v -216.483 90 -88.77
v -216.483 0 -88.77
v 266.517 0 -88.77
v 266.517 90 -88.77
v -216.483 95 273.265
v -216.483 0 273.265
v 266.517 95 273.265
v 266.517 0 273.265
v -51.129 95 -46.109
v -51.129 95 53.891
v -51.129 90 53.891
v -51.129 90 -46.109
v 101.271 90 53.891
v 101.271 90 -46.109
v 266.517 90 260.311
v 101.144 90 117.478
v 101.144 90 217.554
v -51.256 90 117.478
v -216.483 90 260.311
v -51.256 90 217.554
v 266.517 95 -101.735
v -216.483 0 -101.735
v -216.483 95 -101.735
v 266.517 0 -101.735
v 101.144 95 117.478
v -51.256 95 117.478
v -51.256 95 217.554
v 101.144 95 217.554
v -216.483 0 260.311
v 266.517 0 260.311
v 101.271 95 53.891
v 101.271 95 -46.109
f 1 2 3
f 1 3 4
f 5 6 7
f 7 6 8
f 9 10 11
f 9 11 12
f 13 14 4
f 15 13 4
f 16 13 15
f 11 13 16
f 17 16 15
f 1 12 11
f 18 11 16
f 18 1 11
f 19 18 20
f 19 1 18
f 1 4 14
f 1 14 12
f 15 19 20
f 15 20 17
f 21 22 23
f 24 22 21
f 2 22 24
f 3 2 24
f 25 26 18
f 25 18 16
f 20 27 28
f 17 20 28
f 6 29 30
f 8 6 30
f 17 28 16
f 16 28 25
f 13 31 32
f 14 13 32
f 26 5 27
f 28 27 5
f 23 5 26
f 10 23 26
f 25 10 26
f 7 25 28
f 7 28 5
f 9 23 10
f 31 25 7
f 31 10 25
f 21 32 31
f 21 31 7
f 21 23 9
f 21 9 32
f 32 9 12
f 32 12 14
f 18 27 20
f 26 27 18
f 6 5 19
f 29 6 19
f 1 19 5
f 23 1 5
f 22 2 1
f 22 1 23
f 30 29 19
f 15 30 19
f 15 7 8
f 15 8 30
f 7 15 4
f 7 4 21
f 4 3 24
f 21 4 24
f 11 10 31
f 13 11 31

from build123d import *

# Parameters (mm, degrees)
SKETCH1_W           = 483
SKETCH1_H           = 375
BOSS_EXTRUDE1_DEPTH = 95
SKETCH2_W           = 349.080578543
SKETCH2_H           = 90
CUT_EXTRUDE1_DEPTH  = 531.118
SKETCH3_W           = 152.4
SKETCH3_H           = 100
SKETCH3_H_2         = 100.076
CUT_EXTRUDE2_DEPTH  = 531.118


with BuildPart() as part:
    # Sketch1 → Boss-Extrude1 (new body)
    with BuildSketch(Plane(origin=(0, 0, 0), x_dir=(1, 0, 0), z_dir=(0, 1, 0))):
        with Locations((25.017350158, -85.764984227)):
            Rectangle(SKETCH1_W, SKETCH1_H)
    extrude(amount=BOSS_EXTRUDE1_DEPTH)

    # Sketch2 → Cut-Extrude1 (cut)
    with BuildSketch(Plane.ZY.offset(216.482649842)):
        with Locations((85.770694956, 45)):
            Rectangle(SKETCH2_W, SKETCH2_H)
    extrude(amount=-CUT_EXTRUDE1_DEPTH, mode=Mode.SUBTRACT)

    # Sketch3 → Cut-Extrude2 (cut)
    with BuildSketch(Plane(origin=(0, 95, 0), x_dir=(1, 0, 0), z_dir=(0, 1, 0))):
        with Locations((25.071350158, -3.890984227)):
            Rectangle(SKETCH3_W, SKETCH3_H)
        with Locations((24.944350158, -167.516369345)):
            Rectangle(SKETCH3_W, SKETCH3_H_2)
    extrude(amount=-CUT_EXTRUDE2_DEPTH, mode=Mode.SUBTRACT)


solid = part.part
